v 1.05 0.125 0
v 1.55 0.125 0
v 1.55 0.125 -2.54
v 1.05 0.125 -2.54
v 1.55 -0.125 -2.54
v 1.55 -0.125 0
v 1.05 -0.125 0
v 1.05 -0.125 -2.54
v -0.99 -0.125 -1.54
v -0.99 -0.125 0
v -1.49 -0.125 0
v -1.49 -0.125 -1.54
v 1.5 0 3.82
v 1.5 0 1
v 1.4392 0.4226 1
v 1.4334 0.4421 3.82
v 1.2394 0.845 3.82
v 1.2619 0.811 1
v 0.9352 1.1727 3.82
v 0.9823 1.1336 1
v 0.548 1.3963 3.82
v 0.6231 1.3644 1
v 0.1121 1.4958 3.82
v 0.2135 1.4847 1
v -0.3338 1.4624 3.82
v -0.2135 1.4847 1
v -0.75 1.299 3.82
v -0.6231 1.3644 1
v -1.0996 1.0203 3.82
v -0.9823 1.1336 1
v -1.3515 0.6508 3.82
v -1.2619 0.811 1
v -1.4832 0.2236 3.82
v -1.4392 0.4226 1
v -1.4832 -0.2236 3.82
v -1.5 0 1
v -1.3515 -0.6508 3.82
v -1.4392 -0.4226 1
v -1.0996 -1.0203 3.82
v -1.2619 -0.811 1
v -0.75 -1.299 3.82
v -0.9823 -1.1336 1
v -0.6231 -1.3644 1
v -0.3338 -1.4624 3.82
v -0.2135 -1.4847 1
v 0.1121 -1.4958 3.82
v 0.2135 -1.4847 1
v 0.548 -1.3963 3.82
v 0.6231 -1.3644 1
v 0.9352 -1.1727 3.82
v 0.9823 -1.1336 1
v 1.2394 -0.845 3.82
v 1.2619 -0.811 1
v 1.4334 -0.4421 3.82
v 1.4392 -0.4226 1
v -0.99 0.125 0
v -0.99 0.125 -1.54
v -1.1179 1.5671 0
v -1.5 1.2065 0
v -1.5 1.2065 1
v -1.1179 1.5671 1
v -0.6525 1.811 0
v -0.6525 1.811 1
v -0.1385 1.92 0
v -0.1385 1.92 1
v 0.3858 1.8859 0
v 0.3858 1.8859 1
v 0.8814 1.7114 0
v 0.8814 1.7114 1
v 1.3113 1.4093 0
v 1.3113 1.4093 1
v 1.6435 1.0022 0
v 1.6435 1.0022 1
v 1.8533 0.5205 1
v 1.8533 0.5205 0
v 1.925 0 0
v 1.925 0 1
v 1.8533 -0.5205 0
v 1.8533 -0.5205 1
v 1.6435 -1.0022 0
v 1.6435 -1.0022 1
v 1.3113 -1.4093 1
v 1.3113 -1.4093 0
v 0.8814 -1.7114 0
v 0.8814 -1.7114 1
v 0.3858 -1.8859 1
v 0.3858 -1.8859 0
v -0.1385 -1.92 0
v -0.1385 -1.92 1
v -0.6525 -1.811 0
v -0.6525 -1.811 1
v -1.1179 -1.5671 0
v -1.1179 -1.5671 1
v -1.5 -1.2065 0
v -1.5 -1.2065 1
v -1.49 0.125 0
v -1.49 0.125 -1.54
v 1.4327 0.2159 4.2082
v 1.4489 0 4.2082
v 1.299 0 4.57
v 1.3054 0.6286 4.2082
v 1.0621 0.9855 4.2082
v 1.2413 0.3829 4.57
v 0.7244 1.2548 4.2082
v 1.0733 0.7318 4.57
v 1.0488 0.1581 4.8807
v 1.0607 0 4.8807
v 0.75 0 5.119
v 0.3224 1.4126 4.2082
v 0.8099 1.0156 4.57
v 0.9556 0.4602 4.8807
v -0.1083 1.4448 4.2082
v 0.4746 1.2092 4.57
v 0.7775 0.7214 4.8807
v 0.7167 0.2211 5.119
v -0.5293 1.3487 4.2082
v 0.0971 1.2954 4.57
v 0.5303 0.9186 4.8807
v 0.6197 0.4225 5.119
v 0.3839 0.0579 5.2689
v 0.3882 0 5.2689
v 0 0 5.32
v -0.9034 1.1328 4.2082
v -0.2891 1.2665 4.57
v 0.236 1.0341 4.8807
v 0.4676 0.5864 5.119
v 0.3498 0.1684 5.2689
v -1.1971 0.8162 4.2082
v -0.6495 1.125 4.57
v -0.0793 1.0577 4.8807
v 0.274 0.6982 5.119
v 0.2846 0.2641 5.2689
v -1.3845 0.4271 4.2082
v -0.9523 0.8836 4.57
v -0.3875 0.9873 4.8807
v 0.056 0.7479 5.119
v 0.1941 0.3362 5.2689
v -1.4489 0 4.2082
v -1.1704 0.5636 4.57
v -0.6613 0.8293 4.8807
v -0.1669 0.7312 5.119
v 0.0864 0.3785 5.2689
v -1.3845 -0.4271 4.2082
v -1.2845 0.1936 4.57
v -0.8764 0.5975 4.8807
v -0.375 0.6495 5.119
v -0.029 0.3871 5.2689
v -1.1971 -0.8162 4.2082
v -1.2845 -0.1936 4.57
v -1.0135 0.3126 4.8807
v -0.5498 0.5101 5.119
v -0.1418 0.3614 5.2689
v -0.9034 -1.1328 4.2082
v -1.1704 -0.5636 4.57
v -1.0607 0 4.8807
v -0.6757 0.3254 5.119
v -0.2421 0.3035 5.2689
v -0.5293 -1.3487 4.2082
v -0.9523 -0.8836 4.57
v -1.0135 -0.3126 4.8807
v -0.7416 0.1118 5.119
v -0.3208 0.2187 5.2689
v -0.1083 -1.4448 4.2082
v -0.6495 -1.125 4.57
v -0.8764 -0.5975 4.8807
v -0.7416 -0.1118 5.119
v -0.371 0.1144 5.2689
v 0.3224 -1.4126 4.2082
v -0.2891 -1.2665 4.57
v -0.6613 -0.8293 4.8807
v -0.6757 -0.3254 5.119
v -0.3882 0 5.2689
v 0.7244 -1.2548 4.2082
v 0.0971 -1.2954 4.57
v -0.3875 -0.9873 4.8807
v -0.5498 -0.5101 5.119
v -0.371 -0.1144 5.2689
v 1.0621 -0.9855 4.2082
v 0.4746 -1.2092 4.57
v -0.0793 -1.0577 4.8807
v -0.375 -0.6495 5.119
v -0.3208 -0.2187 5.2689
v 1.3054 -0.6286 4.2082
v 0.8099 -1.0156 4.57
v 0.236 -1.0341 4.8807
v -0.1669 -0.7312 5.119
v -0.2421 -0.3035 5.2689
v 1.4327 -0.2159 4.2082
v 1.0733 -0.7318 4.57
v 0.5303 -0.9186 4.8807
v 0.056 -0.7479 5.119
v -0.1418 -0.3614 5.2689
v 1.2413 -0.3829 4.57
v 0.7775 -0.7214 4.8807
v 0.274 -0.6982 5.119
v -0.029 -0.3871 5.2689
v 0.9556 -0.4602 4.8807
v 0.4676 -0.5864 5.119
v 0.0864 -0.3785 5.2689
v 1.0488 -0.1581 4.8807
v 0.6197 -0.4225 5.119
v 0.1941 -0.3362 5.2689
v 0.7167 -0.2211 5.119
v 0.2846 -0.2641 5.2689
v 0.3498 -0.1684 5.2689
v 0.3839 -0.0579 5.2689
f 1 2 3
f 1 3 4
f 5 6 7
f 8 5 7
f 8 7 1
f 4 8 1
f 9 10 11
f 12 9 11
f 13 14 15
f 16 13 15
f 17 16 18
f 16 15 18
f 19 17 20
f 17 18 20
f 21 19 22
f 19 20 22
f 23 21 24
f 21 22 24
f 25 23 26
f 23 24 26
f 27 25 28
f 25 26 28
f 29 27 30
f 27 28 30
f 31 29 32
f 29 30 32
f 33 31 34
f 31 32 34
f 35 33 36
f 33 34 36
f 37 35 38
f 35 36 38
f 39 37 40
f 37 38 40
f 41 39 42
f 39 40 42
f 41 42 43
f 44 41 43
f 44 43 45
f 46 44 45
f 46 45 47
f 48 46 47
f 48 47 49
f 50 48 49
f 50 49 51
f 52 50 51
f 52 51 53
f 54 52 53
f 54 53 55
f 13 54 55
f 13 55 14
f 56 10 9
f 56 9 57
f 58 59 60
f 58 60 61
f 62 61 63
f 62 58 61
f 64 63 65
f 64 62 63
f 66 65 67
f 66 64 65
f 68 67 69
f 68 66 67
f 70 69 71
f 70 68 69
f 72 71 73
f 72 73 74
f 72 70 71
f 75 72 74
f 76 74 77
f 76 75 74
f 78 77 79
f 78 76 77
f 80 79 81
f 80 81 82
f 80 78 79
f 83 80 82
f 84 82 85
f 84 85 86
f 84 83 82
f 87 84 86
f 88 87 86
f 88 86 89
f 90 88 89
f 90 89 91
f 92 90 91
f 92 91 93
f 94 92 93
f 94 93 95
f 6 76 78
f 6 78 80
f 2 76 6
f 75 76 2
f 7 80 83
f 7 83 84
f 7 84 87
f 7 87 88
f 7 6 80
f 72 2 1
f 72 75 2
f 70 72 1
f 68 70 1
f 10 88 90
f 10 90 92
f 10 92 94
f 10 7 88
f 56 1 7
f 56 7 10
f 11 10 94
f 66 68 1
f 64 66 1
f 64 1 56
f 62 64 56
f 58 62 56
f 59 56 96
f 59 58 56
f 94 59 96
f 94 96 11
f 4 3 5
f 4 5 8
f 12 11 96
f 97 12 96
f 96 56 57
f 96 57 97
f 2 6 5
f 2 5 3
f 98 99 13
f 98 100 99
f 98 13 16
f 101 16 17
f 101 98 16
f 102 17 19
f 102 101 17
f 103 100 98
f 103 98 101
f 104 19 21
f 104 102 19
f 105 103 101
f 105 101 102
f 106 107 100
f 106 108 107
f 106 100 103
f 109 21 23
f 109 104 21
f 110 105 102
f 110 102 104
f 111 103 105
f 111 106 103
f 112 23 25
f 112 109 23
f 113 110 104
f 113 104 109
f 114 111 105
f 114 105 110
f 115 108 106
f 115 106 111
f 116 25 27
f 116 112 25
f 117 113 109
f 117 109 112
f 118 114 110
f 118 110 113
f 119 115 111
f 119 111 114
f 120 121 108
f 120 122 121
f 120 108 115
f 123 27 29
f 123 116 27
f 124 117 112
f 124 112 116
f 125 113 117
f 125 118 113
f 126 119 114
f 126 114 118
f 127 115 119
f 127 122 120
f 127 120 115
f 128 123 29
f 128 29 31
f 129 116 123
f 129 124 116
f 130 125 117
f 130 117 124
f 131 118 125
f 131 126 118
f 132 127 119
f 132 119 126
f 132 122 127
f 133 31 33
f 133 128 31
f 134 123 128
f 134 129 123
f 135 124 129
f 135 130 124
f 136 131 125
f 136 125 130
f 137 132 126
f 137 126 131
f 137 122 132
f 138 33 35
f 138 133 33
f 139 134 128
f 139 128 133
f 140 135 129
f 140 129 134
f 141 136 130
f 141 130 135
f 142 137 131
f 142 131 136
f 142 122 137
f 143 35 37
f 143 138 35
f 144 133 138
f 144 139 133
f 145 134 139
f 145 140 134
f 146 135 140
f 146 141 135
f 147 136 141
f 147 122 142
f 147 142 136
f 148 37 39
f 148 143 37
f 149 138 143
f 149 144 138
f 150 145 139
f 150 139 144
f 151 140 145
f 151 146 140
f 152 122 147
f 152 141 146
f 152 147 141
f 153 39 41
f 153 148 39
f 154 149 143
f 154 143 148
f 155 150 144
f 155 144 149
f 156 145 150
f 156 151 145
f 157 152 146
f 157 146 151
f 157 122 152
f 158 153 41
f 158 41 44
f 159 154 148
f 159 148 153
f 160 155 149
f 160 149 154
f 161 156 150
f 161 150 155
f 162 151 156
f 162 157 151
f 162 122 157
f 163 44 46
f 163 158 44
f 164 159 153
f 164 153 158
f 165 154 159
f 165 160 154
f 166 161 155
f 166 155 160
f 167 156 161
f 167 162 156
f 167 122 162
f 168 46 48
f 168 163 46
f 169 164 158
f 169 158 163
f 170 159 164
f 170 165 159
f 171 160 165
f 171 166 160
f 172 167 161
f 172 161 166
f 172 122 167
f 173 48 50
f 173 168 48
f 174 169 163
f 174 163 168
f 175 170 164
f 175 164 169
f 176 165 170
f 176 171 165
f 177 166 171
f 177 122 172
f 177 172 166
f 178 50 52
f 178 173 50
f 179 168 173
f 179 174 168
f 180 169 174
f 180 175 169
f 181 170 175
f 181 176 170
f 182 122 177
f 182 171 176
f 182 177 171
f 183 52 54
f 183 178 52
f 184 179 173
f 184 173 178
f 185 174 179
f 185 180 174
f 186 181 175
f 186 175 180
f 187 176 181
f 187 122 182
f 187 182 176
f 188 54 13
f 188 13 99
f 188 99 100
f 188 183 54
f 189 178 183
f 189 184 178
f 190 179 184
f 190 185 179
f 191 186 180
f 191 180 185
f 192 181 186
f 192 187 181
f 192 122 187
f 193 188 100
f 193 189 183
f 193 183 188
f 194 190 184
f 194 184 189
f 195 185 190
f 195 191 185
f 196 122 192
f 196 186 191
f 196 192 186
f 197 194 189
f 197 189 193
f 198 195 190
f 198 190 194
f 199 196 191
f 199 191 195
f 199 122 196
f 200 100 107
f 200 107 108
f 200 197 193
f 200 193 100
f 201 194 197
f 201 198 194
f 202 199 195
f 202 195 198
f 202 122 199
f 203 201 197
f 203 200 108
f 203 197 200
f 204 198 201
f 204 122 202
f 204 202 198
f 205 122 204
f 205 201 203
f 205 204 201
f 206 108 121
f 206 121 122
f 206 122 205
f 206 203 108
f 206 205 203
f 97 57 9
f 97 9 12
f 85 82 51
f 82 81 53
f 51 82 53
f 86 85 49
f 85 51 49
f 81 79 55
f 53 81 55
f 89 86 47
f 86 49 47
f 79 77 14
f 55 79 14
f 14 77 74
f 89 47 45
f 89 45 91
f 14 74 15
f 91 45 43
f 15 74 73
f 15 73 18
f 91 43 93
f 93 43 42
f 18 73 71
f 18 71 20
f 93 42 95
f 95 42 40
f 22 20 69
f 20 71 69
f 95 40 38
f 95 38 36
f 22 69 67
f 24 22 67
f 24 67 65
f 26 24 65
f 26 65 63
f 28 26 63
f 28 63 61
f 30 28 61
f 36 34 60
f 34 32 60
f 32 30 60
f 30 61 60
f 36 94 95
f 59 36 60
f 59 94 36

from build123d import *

# Parameters (mm, degrees)
ESBO_O1_R                = 1.5
RESSALTO_EXTRUS_O1_DEPTH = 5.32
FILETE1_R                = 1.5
RESSALTO_EXTRUS_O2_DEPTH = 1
ESBO_O3_W                = 0.5
ESBO_O3_H                = 0.25
RESSALTO_EXTRUS_O3_DEPTH = 2.54
ESBO_O4_W                = 0.93593998
ESBO_O4_H                = 0.492175334
CORTE_EXTRUS_O1_DEPTH    = 1


with BuildPart() as part:
    # Esboço1 → Ressalto-extrusão1 (new body)
    with BuildSketch(Plane.XY):
        Circle(ESBO_O1_R)
    extrude(amount=RESSALTO_EXTRUS_O1_DEPTH)

    # Filete1
    filete1_edges = [part.edges().sort_by_distance(p)[0] for p in [
        (-1.5, 0, 5.32),
    ]]
    fillet(filete1_edges, radius=FILETE1_R)

    # Esboço2 → Ressalto-extrusão2 (add)
    with BuildSketch(Plane(origin=(0, 0, 0), x_dir=(-1, 0, 0), z_dir=(0, 0, -1))):
        with BuildLine():
            Line((1.5, -1.206492851), (1.5, 1.206492851))
            ThreePointArc((1.5, 1.206492851), (-1.925, 0), (1.5, -1.206492851))
        make_face()
    extrude(amount=-RESSALTO_EXTRUS_O2_DEPTH)

    # Esboço3 → Ressalto-extrusão3 (add)
    with BuildSketch(Plane(origin=(0, 0, 0), x_dir=(-1, 0, 0), z_dir=(0, 0, -1))):
        with Locations((-1.3, 0)):
            Rectangle(ESBO_O3_W, ESBO_O3_H)
        with Locations((1.24, 0)):
            Rectangle(ESBO_O3_W, ESBO_O3_H)
    extrude(amount=RESSALTO_EXTRUS_O3_DEPTH)

    # Esboço4 → Corte-extrusão1 (cut)
    with BuildSketch(Plane(origin=(0, 0, -2.54), x_dir=(-1, 0, 0), z_dir=(0, 0, -1))):
        with Locations((1.231752211, 0.012102672)):
            Rectangle(ESBO_O4_W, ESBO_O4_H)
    extrude(amount=-CORTE_EXTRUS_O1_DEPTH, mode=Mode.SUBTRACT)


solid = part.part
